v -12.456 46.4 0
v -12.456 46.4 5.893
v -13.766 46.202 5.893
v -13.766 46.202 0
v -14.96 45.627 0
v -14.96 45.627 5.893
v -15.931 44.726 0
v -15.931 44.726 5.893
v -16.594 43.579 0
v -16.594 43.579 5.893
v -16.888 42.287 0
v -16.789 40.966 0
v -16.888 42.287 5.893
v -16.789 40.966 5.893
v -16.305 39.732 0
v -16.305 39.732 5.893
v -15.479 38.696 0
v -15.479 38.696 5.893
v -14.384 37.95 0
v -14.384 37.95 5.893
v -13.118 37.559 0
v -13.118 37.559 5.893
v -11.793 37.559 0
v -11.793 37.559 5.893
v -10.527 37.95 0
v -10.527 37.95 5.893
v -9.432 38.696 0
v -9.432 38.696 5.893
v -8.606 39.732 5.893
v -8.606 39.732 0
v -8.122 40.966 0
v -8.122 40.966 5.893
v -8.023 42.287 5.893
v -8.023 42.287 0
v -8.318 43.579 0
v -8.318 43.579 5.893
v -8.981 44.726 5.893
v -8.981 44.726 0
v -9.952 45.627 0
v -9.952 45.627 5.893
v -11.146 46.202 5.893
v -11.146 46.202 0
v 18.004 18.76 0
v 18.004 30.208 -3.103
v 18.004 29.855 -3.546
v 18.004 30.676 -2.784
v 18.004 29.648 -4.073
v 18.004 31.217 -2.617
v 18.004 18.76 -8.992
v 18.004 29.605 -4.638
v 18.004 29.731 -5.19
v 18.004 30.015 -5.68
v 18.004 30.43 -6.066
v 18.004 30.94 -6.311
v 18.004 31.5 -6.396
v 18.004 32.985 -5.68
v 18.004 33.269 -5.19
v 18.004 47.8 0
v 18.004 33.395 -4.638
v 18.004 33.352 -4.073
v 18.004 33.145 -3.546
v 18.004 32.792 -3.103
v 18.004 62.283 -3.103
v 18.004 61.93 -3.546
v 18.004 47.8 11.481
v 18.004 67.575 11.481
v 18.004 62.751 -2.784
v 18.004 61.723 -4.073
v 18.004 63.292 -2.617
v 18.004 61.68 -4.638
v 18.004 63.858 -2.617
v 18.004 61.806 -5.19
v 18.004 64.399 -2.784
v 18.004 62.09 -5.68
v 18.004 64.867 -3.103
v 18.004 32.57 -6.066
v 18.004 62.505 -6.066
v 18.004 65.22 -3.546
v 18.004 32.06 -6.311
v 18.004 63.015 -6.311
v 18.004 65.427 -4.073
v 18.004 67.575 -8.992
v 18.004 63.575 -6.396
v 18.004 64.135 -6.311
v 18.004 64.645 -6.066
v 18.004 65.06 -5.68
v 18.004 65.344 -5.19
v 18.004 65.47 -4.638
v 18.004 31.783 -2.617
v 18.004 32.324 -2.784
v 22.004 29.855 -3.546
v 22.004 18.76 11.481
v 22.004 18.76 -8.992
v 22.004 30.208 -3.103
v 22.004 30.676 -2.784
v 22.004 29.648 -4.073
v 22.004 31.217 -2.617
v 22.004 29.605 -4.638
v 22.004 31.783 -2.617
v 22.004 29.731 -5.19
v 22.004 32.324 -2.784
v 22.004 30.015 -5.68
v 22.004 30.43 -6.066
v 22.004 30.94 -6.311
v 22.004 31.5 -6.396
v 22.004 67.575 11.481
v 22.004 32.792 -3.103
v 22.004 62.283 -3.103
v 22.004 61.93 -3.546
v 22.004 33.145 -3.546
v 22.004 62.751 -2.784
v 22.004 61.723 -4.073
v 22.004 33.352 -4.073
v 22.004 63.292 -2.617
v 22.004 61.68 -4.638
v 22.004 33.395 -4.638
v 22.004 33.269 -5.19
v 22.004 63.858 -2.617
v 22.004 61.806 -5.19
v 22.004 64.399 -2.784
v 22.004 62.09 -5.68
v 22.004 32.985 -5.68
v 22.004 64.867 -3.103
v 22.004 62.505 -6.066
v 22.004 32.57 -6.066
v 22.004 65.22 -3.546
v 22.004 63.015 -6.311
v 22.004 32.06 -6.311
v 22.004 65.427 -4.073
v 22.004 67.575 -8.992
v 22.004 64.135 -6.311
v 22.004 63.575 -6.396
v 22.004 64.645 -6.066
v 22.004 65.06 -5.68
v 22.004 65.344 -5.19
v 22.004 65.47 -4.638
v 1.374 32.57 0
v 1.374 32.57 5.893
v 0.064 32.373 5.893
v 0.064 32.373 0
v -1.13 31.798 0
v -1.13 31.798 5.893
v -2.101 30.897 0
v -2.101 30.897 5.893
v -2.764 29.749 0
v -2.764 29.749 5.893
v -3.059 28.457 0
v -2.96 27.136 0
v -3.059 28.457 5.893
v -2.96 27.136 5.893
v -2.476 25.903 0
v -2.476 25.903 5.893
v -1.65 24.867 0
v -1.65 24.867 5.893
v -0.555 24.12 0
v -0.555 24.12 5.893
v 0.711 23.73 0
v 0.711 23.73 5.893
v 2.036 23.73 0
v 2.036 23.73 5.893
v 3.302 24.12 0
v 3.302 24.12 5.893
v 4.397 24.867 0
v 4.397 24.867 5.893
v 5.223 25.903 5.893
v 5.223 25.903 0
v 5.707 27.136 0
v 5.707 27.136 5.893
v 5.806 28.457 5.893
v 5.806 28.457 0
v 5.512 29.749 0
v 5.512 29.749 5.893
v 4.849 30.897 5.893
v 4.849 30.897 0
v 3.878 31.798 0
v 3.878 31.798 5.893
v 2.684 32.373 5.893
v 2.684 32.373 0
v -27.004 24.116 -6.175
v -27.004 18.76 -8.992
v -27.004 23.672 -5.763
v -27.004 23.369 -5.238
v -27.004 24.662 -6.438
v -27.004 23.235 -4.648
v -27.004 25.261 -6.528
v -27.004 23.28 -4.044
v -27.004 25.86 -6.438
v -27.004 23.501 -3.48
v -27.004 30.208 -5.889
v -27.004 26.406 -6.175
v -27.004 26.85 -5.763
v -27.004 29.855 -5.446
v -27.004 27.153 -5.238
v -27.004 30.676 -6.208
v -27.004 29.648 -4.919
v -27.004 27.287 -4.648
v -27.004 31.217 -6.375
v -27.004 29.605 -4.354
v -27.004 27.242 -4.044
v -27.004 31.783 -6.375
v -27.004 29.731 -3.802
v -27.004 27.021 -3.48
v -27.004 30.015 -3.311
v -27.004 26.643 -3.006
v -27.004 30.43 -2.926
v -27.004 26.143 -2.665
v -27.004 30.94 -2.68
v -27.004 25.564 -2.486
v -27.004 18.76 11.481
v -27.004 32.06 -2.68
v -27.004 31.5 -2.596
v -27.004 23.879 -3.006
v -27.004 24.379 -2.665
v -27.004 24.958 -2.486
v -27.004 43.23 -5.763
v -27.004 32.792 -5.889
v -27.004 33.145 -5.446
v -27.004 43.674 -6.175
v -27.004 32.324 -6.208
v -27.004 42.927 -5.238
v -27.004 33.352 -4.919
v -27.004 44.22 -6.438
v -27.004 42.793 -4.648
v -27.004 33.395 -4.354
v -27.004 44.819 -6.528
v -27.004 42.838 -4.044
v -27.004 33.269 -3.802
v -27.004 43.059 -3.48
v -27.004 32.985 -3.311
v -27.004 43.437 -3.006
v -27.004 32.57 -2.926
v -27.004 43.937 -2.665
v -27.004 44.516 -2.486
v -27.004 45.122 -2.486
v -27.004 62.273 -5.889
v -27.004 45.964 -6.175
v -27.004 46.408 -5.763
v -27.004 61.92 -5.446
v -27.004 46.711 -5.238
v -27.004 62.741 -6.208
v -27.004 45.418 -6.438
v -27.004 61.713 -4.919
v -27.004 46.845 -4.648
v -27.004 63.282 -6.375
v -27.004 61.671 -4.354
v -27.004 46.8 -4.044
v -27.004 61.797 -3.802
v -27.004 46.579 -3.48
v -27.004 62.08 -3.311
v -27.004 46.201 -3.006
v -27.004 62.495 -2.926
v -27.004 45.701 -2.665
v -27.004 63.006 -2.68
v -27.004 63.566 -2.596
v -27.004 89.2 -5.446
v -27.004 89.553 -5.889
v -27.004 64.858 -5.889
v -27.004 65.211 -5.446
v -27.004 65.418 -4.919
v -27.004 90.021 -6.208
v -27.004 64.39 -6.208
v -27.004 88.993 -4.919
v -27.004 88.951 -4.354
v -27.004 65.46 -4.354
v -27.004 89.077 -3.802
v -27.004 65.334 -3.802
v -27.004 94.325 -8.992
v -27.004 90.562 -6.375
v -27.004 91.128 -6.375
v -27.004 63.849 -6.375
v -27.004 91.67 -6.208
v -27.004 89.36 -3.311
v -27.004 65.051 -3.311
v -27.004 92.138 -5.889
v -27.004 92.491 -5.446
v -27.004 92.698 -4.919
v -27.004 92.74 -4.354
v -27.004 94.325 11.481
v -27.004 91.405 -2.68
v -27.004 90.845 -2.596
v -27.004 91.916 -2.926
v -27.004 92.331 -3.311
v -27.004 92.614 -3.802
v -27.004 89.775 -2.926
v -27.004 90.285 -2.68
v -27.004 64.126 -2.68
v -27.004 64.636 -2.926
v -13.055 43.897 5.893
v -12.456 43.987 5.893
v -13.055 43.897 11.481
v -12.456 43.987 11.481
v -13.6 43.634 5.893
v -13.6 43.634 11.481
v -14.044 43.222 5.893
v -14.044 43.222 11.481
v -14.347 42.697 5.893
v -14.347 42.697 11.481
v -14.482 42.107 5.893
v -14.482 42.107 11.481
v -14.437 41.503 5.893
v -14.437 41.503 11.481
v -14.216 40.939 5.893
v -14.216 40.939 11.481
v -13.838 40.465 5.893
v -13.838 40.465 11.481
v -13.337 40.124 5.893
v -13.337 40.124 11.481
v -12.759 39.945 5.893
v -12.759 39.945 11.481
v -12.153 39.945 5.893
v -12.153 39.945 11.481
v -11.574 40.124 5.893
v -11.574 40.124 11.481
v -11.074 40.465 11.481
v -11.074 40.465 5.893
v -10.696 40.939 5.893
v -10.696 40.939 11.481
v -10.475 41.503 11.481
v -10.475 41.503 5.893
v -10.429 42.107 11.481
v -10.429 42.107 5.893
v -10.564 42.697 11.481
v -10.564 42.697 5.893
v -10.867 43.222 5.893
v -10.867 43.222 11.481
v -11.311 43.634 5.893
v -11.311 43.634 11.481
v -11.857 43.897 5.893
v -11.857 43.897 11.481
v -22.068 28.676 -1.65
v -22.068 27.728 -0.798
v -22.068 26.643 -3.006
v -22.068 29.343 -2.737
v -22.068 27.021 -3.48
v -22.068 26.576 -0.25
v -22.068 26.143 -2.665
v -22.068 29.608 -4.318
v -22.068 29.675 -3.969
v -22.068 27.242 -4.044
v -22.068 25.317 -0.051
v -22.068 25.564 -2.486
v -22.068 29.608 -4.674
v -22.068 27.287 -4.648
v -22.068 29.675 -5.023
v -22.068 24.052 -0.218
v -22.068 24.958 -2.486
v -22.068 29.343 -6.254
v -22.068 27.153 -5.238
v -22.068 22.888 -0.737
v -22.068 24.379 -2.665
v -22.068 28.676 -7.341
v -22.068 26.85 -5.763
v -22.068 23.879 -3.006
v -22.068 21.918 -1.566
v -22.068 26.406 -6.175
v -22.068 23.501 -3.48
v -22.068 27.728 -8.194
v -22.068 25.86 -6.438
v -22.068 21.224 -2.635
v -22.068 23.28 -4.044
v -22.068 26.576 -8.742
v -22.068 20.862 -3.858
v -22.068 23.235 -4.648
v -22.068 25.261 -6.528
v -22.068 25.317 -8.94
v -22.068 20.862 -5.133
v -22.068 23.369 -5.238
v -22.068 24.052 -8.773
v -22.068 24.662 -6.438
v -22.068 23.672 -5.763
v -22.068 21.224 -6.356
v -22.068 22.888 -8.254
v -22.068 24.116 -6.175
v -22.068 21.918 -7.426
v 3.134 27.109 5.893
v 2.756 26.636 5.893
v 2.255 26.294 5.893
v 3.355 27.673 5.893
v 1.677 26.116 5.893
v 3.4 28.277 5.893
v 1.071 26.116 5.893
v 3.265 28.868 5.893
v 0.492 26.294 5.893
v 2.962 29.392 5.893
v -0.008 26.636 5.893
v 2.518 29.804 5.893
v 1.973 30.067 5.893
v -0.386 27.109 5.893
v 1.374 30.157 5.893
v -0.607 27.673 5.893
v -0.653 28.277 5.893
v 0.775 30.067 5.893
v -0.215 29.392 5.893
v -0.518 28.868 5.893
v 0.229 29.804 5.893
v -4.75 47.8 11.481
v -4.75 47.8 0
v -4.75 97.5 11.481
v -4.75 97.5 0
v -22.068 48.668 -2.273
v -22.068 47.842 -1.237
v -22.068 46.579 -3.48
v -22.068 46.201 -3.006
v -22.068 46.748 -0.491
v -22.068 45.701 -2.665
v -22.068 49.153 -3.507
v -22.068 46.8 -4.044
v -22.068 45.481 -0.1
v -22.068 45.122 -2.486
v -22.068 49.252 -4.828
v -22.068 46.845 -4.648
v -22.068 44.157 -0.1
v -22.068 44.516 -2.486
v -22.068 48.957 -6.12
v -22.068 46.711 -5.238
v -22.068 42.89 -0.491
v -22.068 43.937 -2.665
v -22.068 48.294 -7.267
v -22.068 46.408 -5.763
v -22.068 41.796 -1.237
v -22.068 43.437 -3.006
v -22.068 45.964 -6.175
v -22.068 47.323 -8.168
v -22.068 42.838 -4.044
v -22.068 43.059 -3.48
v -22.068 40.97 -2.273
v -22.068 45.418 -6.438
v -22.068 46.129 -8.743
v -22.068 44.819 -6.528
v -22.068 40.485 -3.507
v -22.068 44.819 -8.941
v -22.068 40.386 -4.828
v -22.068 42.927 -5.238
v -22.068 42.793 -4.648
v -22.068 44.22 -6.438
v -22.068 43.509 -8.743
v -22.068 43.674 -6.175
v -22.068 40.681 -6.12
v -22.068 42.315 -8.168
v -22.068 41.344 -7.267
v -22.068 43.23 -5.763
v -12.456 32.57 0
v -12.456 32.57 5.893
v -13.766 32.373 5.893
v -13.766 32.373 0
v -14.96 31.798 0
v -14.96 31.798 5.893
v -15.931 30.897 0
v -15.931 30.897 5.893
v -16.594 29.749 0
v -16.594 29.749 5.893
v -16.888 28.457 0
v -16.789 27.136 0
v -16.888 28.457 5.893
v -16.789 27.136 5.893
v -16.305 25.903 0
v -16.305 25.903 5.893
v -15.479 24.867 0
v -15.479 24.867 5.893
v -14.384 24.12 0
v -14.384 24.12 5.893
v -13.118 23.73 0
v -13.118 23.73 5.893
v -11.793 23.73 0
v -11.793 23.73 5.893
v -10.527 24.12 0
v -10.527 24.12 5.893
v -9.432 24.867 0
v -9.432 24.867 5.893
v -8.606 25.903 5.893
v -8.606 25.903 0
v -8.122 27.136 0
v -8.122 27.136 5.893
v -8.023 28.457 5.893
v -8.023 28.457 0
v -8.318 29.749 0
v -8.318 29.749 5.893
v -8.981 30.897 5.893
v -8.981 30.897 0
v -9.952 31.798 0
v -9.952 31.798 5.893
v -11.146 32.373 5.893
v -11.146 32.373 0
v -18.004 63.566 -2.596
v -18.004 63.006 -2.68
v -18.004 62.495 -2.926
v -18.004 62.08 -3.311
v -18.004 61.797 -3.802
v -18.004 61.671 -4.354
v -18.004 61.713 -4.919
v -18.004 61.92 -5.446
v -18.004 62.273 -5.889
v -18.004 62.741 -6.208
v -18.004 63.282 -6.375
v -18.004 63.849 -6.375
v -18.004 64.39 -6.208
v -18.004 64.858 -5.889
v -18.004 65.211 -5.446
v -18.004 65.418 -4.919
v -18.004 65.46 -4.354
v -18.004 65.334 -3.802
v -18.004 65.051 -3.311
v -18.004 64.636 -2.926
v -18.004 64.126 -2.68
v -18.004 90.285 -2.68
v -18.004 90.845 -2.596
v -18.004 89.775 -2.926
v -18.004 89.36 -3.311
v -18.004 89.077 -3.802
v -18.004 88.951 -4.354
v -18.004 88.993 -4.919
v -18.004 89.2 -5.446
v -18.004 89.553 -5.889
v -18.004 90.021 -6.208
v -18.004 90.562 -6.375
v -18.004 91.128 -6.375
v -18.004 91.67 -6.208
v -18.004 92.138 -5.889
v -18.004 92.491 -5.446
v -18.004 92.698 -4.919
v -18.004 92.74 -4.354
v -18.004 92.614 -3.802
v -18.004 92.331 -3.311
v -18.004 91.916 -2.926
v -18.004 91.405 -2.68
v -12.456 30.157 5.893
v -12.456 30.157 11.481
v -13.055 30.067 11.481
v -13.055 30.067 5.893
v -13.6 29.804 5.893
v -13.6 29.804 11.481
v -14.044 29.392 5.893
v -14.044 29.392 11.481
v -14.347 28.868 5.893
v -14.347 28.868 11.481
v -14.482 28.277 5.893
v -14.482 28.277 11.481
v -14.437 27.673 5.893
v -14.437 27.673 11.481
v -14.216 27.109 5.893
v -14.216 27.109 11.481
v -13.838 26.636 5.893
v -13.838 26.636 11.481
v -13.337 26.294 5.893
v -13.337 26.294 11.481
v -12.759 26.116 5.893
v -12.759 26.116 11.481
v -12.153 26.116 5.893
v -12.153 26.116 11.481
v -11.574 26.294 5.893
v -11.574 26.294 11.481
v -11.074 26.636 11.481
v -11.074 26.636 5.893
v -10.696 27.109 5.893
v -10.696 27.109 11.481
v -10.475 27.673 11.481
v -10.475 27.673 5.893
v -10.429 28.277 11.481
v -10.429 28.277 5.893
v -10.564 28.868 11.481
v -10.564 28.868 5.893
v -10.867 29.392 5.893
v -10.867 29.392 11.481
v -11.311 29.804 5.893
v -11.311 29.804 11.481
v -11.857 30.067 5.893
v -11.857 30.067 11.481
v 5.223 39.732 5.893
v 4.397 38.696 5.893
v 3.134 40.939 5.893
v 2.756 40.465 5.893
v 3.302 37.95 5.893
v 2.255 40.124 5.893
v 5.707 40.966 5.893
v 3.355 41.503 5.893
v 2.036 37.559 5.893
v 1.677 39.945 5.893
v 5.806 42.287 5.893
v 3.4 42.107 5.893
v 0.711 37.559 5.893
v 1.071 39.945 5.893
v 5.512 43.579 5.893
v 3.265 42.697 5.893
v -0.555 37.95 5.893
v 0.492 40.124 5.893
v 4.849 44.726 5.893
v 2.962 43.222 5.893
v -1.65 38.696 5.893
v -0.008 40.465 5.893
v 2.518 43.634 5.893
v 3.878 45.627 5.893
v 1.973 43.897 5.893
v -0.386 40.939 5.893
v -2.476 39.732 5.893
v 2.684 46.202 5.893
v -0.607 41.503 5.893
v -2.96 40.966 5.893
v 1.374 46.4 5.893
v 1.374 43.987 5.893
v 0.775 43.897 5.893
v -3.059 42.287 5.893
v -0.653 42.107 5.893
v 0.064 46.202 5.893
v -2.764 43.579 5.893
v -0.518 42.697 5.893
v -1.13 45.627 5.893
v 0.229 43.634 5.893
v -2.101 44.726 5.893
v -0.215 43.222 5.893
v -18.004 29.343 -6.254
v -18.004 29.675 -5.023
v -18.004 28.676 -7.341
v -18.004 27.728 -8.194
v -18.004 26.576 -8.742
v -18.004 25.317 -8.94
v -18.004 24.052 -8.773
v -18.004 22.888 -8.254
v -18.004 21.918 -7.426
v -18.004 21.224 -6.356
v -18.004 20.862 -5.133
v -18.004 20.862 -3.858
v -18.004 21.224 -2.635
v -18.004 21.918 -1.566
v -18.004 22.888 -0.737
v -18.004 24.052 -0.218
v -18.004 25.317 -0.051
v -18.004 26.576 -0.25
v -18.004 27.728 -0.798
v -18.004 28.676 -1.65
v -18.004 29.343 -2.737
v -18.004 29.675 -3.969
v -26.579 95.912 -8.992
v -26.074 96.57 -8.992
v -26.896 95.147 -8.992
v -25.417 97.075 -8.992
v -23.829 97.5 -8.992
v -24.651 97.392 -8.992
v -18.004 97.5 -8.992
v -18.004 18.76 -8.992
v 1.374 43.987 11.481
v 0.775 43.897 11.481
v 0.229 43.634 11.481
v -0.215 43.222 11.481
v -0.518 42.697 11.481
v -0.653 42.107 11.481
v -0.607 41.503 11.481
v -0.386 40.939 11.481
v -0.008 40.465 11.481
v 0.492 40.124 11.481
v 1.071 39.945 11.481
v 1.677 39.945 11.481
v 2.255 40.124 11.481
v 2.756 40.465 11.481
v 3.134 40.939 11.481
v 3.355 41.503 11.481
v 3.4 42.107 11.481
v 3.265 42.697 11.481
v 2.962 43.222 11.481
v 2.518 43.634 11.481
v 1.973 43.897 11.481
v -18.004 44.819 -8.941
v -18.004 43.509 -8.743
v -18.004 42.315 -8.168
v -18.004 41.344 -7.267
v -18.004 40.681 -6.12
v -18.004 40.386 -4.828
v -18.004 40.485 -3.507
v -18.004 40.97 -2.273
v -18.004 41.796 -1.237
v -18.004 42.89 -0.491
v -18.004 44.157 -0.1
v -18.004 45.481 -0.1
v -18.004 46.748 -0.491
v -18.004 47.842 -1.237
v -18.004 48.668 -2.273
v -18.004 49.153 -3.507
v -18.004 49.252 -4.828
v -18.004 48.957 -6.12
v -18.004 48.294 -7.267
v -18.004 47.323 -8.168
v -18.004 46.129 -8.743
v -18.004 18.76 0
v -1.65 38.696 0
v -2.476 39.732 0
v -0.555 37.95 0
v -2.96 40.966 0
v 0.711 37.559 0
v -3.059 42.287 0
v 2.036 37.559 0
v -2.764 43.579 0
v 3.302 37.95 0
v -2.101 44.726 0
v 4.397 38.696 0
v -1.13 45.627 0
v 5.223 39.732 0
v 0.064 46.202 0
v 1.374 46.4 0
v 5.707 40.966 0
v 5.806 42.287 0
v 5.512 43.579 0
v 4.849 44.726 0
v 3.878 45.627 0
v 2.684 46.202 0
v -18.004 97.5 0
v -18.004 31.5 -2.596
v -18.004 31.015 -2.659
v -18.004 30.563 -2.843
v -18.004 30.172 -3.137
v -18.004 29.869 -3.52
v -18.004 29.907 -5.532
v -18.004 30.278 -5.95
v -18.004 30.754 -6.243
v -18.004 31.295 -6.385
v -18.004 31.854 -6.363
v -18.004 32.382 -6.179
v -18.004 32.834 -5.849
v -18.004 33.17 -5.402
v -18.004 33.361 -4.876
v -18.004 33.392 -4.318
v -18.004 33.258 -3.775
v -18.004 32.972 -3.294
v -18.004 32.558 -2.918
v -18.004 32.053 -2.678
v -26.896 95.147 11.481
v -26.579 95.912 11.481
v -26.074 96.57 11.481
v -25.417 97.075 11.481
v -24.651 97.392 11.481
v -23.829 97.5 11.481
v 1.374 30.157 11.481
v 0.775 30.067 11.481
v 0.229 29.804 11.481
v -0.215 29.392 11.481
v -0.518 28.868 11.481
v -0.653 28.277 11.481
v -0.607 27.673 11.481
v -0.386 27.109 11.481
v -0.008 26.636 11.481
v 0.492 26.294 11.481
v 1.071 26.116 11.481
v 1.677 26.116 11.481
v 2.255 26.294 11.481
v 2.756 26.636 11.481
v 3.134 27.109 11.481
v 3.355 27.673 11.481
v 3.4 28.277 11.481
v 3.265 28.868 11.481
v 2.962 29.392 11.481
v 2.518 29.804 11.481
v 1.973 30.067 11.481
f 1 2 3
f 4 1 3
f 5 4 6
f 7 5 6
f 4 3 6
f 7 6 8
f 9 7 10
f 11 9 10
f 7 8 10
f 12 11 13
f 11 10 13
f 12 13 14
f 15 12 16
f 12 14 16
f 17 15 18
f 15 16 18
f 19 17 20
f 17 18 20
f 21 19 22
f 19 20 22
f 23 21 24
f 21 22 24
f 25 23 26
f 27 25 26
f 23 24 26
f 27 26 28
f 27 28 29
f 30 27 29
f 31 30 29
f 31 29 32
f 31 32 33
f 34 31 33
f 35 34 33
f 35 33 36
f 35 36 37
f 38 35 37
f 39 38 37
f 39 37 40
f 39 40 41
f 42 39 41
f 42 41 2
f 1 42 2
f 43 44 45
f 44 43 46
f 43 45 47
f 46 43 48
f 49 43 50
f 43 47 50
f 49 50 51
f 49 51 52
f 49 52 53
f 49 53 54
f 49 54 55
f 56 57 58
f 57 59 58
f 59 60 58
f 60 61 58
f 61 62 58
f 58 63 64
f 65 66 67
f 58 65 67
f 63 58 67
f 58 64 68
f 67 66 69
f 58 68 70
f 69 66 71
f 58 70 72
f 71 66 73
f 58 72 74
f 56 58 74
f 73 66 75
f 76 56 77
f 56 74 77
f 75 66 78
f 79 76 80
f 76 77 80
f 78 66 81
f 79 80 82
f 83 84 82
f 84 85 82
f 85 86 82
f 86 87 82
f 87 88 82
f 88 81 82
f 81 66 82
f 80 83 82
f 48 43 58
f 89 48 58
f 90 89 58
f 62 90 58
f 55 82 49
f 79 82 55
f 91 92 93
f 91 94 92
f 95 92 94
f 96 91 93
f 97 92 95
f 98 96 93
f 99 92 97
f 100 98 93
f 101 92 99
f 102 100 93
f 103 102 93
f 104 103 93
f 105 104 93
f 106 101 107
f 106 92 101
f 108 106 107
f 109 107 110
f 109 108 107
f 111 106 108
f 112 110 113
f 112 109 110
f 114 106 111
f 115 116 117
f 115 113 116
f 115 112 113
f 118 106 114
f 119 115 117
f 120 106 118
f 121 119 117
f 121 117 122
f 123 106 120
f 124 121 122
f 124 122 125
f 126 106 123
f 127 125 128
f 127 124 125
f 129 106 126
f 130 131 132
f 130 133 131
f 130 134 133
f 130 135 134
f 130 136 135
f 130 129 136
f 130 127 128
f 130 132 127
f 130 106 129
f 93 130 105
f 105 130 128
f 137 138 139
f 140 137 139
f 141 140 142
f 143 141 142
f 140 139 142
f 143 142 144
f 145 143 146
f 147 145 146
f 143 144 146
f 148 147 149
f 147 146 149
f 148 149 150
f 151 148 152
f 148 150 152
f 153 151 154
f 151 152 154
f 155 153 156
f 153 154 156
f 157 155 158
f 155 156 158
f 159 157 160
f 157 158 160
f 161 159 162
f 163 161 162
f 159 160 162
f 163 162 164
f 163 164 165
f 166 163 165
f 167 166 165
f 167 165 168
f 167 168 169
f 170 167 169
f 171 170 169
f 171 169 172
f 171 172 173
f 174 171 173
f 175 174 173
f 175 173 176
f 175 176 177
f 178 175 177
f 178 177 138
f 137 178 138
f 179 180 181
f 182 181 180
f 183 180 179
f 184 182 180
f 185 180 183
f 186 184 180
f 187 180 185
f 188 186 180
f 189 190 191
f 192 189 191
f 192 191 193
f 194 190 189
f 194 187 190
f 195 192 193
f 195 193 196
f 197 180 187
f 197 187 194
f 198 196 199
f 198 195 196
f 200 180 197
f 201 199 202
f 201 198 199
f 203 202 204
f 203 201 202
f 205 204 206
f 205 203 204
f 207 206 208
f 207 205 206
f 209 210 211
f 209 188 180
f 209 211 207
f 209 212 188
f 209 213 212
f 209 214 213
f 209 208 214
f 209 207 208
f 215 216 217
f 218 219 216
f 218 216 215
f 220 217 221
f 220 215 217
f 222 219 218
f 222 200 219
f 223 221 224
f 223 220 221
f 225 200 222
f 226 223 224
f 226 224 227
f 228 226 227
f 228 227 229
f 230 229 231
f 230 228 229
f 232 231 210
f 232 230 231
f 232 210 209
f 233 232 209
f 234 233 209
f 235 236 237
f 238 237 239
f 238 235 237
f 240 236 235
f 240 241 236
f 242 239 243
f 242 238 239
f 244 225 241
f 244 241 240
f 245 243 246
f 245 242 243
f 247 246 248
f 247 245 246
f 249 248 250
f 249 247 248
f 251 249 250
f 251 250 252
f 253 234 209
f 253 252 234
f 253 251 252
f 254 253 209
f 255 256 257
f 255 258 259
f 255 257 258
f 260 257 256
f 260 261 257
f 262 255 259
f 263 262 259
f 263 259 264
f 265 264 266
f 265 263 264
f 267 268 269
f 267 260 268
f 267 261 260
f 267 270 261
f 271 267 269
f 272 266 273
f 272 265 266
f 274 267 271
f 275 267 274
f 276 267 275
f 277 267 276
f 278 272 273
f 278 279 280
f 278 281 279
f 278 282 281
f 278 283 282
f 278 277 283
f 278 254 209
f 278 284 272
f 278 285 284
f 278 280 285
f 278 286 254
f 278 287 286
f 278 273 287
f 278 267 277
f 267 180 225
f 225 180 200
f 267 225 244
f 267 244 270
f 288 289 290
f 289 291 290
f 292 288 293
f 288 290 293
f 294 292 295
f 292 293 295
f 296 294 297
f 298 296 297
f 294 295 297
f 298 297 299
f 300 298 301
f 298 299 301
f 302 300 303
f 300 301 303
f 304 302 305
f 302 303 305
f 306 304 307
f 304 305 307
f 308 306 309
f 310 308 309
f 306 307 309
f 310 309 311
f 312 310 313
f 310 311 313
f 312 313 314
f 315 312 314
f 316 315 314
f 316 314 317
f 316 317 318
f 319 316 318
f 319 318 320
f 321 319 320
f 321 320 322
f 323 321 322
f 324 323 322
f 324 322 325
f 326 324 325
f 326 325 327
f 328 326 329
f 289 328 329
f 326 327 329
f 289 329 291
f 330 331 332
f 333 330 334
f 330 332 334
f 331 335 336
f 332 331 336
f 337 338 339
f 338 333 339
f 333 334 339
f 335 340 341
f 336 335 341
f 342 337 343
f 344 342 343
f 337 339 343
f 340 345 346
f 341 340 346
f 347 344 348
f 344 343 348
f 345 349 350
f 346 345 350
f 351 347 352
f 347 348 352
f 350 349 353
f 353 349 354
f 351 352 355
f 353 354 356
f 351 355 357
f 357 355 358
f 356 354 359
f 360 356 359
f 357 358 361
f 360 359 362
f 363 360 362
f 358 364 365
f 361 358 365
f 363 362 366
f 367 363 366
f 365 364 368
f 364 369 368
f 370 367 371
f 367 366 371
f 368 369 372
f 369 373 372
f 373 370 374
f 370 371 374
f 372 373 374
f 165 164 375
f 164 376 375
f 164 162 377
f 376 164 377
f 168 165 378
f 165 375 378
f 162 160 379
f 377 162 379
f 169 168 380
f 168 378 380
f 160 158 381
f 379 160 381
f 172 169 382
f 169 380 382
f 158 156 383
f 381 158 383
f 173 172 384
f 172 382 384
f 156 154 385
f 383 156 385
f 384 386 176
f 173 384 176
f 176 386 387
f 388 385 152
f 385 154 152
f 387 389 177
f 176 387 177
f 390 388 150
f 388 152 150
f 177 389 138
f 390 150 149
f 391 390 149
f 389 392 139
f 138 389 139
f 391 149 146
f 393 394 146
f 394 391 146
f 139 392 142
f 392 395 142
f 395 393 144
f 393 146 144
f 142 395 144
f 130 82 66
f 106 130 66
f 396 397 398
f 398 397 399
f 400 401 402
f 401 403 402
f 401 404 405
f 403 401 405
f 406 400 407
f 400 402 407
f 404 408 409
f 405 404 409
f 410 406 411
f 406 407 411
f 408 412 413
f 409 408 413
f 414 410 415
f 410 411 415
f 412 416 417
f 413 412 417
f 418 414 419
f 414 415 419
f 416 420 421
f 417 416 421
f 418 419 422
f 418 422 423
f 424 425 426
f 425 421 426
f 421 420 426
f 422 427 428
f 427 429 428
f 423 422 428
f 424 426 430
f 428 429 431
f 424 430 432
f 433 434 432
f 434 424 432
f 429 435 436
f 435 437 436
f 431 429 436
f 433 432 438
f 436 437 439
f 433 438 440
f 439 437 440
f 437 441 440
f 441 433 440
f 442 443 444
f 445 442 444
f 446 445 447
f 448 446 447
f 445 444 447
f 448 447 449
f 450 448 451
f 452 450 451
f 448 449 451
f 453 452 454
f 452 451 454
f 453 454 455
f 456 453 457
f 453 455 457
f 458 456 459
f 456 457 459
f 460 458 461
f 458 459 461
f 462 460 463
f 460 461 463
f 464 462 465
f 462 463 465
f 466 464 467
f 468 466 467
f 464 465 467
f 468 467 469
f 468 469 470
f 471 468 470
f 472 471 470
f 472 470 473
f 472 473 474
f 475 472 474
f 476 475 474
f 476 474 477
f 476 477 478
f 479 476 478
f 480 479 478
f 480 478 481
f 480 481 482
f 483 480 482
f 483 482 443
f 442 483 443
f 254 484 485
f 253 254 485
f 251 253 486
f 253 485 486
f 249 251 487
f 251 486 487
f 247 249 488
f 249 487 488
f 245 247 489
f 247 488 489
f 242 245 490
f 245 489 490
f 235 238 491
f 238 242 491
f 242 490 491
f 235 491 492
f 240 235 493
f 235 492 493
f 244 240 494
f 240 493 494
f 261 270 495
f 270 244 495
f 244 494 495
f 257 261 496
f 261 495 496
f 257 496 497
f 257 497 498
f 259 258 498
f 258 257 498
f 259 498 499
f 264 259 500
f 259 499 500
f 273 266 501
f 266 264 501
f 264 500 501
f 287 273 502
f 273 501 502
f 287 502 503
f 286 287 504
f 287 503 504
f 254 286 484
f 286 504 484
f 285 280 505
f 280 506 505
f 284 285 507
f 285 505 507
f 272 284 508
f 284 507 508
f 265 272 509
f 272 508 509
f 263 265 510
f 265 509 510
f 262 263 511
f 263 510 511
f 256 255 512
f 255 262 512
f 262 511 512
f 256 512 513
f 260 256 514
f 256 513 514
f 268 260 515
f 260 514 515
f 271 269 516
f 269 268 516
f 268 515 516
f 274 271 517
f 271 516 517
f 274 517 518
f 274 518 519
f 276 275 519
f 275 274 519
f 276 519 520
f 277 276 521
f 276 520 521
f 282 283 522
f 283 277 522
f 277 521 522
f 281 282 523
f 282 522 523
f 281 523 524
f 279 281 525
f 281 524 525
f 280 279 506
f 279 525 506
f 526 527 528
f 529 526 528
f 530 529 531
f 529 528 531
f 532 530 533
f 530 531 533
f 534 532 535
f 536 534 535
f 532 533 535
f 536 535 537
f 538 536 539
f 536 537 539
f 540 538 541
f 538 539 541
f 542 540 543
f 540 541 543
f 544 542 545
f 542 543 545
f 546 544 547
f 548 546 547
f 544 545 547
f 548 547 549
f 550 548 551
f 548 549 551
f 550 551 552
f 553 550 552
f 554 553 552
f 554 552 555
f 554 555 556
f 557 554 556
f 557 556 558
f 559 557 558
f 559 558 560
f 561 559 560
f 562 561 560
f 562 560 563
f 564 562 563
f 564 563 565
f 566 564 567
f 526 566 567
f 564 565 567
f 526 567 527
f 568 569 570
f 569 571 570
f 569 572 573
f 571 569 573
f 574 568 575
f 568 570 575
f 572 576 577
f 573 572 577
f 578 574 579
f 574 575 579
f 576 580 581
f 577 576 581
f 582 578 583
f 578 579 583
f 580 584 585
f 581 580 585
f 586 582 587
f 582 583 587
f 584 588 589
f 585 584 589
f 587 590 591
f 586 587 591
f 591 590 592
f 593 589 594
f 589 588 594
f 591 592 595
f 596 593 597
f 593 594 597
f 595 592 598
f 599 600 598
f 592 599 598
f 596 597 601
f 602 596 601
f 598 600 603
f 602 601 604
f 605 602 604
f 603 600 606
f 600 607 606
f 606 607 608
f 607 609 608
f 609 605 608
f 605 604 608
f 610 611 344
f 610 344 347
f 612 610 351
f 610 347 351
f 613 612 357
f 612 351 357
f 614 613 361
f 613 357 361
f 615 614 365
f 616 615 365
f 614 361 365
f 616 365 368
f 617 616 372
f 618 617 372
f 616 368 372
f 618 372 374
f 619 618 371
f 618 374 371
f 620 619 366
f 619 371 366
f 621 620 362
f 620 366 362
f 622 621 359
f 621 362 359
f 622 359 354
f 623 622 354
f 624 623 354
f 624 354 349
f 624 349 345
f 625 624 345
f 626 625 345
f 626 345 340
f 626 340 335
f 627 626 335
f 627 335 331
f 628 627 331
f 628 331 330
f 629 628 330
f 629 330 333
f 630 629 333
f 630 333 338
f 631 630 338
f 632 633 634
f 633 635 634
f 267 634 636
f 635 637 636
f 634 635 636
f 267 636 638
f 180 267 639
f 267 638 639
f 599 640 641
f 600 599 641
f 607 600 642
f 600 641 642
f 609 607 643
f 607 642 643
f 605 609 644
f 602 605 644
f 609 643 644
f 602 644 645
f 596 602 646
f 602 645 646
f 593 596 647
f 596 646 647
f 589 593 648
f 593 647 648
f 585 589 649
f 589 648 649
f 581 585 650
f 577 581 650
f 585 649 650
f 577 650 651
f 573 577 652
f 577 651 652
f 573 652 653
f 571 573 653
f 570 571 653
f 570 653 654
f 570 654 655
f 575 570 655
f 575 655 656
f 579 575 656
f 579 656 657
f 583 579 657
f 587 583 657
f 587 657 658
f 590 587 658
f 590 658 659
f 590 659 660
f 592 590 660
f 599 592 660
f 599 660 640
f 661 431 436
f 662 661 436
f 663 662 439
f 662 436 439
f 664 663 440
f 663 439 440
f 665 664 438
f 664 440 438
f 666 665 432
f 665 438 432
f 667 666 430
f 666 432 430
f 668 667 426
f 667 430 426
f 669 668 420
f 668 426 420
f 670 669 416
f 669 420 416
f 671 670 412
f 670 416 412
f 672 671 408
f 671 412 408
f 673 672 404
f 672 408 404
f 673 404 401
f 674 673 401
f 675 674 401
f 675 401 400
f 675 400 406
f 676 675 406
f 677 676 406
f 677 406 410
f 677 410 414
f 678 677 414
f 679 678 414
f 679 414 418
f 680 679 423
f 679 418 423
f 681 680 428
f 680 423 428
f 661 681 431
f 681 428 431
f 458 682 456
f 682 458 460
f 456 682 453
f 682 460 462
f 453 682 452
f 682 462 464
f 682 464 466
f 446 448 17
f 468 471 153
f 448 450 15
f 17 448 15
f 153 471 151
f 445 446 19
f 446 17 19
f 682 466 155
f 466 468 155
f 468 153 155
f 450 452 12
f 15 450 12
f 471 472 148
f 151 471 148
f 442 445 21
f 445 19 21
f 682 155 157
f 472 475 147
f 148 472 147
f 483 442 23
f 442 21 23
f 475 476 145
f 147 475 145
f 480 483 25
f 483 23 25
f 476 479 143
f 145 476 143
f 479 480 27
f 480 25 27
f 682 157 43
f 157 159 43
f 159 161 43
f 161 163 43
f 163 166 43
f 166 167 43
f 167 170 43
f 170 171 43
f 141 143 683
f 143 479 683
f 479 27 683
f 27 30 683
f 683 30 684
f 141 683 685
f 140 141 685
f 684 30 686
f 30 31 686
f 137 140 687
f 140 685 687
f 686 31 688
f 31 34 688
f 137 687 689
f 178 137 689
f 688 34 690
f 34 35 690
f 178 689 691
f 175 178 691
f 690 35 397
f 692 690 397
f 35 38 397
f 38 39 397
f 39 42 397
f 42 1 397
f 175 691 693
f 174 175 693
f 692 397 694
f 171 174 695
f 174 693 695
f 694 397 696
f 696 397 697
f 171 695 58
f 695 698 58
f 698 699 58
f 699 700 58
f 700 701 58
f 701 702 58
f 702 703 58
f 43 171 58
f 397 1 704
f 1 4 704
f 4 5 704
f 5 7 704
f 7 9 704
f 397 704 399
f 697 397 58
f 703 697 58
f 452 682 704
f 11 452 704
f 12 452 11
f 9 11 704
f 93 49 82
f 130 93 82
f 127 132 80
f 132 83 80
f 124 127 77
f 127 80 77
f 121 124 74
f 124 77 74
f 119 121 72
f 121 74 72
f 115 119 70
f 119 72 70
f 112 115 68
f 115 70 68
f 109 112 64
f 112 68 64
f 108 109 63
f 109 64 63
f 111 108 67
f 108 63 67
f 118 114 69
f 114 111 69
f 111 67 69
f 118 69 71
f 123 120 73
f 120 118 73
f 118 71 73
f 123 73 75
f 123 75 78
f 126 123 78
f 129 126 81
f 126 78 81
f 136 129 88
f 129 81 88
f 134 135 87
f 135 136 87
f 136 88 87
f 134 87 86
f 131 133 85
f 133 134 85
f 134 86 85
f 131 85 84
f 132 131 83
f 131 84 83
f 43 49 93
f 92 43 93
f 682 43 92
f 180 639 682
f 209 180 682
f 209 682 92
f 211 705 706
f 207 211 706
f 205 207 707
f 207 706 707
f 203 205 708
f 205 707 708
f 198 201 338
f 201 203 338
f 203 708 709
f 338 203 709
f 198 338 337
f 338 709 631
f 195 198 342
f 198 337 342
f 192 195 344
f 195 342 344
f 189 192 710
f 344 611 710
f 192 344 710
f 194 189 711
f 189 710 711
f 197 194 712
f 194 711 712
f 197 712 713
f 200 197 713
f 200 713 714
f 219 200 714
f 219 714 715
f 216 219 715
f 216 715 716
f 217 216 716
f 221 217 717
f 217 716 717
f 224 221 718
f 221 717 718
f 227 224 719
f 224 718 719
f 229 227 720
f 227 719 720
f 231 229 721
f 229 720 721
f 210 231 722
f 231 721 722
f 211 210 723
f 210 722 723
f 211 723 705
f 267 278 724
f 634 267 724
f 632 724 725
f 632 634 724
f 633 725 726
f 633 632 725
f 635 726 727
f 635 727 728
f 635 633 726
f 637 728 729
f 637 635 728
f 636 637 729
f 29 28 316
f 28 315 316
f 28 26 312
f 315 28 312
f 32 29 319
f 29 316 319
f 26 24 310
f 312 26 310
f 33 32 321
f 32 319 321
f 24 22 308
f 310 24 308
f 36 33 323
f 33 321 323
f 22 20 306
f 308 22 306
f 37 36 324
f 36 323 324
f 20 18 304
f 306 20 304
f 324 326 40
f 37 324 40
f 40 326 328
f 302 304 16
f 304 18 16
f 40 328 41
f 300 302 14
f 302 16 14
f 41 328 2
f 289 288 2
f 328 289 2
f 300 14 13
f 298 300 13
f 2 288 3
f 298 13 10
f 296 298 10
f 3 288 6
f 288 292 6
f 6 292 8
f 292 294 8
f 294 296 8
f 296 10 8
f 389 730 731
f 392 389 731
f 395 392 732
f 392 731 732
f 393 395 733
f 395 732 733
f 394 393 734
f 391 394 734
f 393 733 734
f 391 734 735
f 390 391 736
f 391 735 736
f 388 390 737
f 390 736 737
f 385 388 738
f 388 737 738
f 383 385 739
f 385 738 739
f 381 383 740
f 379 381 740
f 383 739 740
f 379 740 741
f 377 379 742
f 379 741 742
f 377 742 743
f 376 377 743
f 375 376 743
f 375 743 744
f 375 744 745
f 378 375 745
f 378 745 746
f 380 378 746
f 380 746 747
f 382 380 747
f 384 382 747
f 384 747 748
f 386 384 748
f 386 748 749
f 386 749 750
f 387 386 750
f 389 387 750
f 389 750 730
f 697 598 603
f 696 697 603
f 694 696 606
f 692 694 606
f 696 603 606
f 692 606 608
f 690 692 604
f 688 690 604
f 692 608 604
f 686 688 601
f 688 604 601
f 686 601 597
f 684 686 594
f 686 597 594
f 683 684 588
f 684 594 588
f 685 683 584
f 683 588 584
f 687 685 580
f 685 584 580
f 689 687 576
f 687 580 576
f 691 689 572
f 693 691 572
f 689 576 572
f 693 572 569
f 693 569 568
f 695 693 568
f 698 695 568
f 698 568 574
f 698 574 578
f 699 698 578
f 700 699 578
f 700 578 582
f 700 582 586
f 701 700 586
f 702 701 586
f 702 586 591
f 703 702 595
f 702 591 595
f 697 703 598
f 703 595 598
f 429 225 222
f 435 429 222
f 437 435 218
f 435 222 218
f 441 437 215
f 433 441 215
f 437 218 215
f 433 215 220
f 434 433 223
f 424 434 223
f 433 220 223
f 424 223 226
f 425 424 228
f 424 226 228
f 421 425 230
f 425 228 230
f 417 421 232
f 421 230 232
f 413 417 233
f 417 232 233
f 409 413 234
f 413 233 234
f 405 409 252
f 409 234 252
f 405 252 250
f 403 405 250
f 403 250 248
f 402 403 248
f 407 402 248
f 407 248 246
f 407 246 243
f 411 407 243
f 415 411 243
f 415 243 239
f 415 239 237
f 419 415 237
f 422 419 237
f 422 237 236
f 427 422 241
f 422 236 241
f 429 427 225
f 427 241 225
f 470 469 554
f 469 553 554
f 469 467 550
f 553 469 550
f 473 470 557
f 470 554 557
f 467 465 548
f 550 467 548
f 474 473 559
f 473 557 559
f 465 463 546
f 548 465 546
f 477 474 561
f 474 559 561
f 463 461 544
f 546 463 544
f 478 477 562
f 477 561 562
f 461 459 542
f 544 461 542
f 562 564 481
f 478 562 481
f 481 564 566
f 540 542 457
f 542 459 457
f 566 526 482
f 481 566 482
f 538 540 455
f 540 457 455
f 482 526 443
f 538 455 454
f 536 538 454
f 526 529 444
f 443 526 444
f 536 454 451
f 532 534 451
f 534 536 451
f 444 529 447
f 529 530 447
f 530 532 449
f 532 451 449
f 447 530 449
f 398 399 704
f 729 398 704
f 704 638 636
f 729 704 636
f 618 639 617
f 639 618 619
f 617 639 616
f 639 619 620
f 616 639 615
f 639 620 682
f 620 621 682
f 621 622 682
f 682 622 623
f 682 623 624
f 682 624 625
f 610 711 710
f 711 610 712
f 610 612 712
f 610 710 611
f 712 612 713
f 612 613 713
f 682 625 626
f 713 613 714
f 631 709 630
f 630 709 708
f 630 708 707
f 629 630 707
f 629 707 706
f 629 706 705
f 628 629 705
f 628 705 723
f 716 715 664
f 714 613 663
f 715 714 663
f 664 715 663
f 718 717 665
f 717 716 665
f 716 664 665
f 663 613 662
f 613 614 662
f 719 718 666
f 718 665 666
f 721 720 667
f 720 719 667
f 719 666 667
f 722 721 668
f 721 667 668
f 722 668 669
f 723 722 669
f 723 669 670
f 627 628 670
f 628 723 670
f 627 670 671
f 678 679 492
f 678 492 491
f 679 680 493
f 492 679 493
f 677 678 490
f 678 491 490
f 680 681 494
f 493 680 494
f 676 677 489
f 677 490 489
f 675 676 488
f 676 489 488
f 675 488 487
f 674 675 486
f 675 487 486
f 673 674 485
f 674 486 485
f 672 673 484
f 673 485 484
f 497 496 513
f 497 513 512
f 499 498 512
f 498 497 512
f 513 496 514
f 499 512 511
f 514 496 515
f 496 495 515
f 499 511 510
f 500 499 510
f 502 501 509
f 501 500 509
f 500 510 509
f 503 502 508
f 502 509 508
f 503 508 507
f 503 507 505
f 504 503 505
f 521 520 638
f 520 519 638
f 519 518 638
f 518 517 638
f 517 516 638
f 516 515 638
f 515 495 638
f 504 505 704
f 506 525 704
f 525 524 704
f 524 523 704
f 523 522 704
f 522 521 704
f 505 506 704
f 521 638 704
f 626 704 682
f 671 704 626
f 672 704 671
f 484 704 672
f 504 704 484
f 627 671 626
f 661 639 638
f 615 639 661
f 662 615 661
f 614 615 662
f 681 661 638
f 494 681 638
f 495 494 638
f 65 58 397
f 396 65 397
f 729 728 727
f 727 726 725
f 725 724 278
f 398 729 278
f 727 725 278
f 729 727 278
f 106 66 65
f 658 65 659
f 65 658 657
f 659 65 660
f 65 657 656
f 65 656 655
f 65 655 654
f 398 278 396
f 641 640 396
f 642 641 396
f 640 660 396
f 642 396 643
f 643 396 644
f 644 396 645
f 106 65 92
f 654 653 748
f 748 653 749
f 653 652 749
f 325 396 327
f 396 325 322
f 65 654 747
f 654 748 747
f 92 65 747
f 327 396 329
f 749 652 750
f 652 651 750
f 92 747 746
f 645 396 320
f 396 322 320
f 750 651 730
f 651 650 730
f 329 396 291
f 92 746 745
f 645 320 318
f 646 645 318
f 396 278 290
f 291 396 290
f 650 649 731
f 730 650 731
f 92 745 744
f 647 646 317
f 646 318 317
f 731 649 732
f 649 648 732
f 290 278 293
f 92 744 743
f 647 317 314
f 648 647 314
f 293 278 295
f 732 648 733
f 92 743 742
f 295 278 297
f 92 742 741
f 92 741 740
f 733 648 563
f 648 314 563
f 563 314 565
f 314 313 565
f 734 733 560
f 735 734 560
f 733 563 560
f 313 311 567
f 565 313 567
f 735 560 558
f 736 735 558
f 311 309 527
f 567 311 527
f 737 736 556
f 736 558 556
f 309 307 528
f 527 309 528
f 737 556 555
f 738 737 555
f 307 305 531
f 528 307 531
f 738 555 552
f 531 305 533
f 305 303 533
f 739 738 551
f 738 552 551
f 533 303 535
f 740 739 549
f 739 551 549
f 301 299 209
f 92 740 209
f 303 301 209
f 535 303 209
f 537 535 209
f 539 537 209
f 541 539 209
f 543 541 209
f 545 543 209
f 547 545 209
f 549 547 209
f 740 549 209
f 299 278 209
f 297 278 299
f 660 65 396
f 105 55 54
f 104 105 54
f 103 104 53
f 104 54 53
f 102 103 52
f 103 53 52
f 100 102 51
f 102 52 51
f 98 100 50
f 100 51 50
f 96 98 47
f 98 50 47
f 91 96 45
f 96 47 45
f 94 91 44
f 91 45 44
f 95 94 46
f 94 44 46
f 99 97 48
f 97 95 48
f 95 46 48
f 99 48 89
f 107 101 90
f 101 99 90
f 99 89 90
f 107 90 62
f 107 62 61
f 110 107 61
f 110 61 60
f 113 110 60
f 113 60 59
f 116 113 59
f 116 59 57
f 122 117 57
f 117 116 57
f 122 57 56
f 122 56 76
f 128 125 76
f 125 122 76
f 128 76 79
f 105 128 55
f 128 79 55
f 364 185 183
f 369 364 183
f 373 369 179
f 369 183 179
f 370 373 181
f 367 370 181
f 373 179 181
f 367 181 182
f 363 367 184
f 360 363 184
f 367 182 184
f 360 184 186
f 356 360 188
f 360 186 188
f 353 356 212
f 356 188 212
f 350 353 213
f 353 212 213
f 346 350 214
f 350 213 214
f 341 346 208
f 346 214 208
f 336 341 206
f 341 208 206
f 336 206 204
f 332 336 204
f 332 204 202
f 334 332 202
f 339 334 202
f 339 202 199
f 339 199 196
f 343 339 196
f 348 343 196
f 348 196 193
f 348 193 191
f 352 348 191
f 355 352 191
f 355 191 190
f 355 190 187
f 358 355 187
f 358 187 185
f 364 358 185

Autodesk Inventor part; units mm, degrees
ref_plane "YZ Plane" through (0, 0, 0) normal (1, 0, 0) x (0, 1, 0)
ref_plane "XZ Plane" through (0, 0, 0) normal (0, 1, 0) x (-1, 0, 0)
ref_plane "Work Plane1" through (0, 0, 0) normal (0, 0, 1) x (1, 0, 0)
sketch "Sketch1" plane through (0, 0, 0) normal (0, 0, 1) x (1, 0, 0)
  line L0 (-13.625, 22.3146) -> (-10.375, 22.3146) construction
  line L1 (3.2502, 80.8) -> (3.2502, 93.5) construction
  line L2 (14.75, 68.1) -> (10.0002, 68.1) construction
  circle A0 centre (12.375, 55.8) radius 3.5 construction
  circle A1 centre (12.375, 47.8) radius 1.7 construction
  line L3 (-18.004, 18.76) -> (18.004, 18.76)
  line L4 (18.004, 18.76) -> (18.004, 47.8)
  line L5 (18.004, 47.8) -> (-4.75, 47.8)
  line L6 (-18.004, 47.8) -> (-18.004, 18.76)
  line L7 (-1.55, 84.1622) -> (-1.55, 90.1378) construction
  line L8 (-4.75, 85.6895) -> (-4.75, 88.6105) construction
  line L9 (17.75, 97.5) -> (-17.75, 97.5) construction
  line L10 (-4.75, 47.8) -> (-4.75, 97.5)
  line L11 (-4.75, 97.5) -> (-18.004, 97.5)
  line L12 (-18.004, 97.5) -> (-18.004, 47.8)
  point P0 (0, 0)
  dimension "d51" = 18.004
  dimension "d52" = 18.004
  dimension "d78" = 97.5
  dimension "d79" = 78.74
extrude "Base shape" add sketch "Sketch1" along normal blind 11.4808
sketch "Sketch4" plane through (-18.004, 18.76, 0) normal (-1, 0, 0) x (0, 0, 1)
  line L0 (0, 78.74) -> (11.4808, 78.74) projected
  line L1 (11.4808, 78.74) -> (-8.9916, 78.74)
  line L2 (-8.9916, 78.74) -> (-8.9916, 0)
  line L3 (-8.9916, 0) -> (11.4808, 0)
  line L4 (11.4808, 0) -> (11.4808, 78.74)
  circle A0 centre (-4.4958, 72.0852) radius 1.9
  line L5 (0, 78.74) -> (0, 0) projected
  circle A1 centre (-4.4958, 44.8056) radius 1.9
  circle A2 centre (-4.4958, 12.74) radius 1.9
  point P0 (0, -18.76)
  dimension "d29" = 3.8
  dimension "d30" = 6.6548
  dimension "d32" = 4.4958
  dimension "d33" = 3.8
  dimension "d34" = 3.8
  dimension "d35" = 33.9344
  dimension "d36" = 66
  dimension "d53" = 8.9916
  dimension "d54" = 4.4958
  dimension "d55" = 4.4958
extrude "Non Pulley Side" add sketch "Sketch4" along normal blind 9
sketch "Sketch5" plane through (18.004, 18.76, 0) normal (1, 0, 0) x (0, 0, -1)
  line L0 (0, 0) -> (-11.4808, 0) projected
  line L1 (0, 78.74) -> (8.9916, 78.74) projected
  line L2 (-11.4808, 0) -> (8.9916, 0)
  line L3 (8.9916, 0) -> (8.9916, 48.815)
  line L4 (8.9916, 78.74) -> (-9.652, 78.74) construction
  line L5 (-11.4808, 48.815) -> (-11.4808, 0)
  circle A0 centre (4.4958, 12.74) radius 1.9
  circle A1 centre (4.4958, 44.815) radius 1.9
  line L6 (8.9916, 78.74) -> (8.9916, 0) projected
  line L7 (8.9916, 48.815) -> (-11.4808, 48.815)
  point P0 (0, -18.76)
  dimension "d40" = 3.8
  dimension "d42" = 66
  dimension "d43" = 3.8
  dimension "d44" = 33.925
  dimension "d45" = 4.4958
  dimension "d46" = 4.4958
  dimension "d49" = 4
extrude "Pulley Side" add sketch "Sketch5" along normal blind 4
sketch "Sketch7" plane through (0, 0, 0) normal (0, 0, -1) x (-1, 0, 0)
  circle A0 centre (5.541, 35.04) radius 9.779 construction
  line L0 (27.004, 97.5) -> (27.004, 18.76) construction
  line L1 (5.541, 35.04) -> (12.4558, 28.1252) construction
  line L2 (5.541, 35.04) -> (15.32, 35.04) construction
  line L3 (36.0056, 35.04) -> (-27.0056, 35.04) projected
  point P0 (0, 0)
  point P1 (12.4558, 41.9548)
  point P2 (-1.3738, 41.9548)
  point P3 (-1.3738, 28.1252)
  dimension "d63" = 19.558
  dimension "d64" = 21.463
  dimension "d65" = 45
  dimension "d66" = 0
  dimension "d69" = 360
hole "Turntable mounting holes" at (-12.4558, 41.9548, 0) at (1.3738, 41.9548, 0) at (1.3738, 28.1252, 0) at (-12.4558, 28.1252, 0) direction (0, 0, 1) diameter 4.064 end through all counterbore diameter 8.89 counterbore depth 5.8928
ref_plane "Work Plane5" through (-12.4558, 35.04, 5.8928) normal (0, 1, 0) x (0, 0, -1)
ref_plane "Work Plane3" through (-12.4558, 28.1252, 5.8928) normal (0, 1, 0) x (0, 0, -1)
ref_plane "Work Plane4" through (-12.4558, 41.9548, 5.8928) normal (0, 1, 0) x (0, 0, -1)
sketch "Sketch6" plane through (-18.004, 18.76, 0) normal (1, 0, 0) x (0, 0, -1)
  line L0 (8.9916, 0) -> (-11.4808, 0) projected
  line L1 (8.9916, 78.74) -> (8.9916, 0) projected
  line L2 (-15.5753, 16.28) -> (13.0861, 16.28) projected
  point P0 (0, -18.76)
  point P1 (4.4958, 6.501)
  point P2 (4.4958, 26.059)
  dimension "d85" = 9.779
  dimension "d86" = 9.779
  dimension "d87" = 4.4958
  dimension "d88" = 4.4958
hole "Servo mounting holes" at (-18.004, 25.261, -4.4958) at (-18.004, 44.819, -4.4958) direction (-1, 0, 0) diameter 4.064 end through all counterbore diameter 8.89 counterbore depth 4.064
fillet "Fillet2" radius 3.175 1 edges at (-27.004, 97.5, 1.2446)
equation "\"d32\" = 0.5 * d31"
equation "\"d33\" = d29"
equation "\"d34\" = d29"
equation "\"d54\" = d32"
equation "\"d55\" = d32"
equation "\"d40\" = d29"
equation "\"d43\" = d29"
equation "\"d45\" = d32"
equation "\"d46\" = d32"
equation "\"d86\" = d85"
equation "\"d88\" = d87"
equation "\"d31\" = 8.9916"
properties part number "Collector mount adapter"
